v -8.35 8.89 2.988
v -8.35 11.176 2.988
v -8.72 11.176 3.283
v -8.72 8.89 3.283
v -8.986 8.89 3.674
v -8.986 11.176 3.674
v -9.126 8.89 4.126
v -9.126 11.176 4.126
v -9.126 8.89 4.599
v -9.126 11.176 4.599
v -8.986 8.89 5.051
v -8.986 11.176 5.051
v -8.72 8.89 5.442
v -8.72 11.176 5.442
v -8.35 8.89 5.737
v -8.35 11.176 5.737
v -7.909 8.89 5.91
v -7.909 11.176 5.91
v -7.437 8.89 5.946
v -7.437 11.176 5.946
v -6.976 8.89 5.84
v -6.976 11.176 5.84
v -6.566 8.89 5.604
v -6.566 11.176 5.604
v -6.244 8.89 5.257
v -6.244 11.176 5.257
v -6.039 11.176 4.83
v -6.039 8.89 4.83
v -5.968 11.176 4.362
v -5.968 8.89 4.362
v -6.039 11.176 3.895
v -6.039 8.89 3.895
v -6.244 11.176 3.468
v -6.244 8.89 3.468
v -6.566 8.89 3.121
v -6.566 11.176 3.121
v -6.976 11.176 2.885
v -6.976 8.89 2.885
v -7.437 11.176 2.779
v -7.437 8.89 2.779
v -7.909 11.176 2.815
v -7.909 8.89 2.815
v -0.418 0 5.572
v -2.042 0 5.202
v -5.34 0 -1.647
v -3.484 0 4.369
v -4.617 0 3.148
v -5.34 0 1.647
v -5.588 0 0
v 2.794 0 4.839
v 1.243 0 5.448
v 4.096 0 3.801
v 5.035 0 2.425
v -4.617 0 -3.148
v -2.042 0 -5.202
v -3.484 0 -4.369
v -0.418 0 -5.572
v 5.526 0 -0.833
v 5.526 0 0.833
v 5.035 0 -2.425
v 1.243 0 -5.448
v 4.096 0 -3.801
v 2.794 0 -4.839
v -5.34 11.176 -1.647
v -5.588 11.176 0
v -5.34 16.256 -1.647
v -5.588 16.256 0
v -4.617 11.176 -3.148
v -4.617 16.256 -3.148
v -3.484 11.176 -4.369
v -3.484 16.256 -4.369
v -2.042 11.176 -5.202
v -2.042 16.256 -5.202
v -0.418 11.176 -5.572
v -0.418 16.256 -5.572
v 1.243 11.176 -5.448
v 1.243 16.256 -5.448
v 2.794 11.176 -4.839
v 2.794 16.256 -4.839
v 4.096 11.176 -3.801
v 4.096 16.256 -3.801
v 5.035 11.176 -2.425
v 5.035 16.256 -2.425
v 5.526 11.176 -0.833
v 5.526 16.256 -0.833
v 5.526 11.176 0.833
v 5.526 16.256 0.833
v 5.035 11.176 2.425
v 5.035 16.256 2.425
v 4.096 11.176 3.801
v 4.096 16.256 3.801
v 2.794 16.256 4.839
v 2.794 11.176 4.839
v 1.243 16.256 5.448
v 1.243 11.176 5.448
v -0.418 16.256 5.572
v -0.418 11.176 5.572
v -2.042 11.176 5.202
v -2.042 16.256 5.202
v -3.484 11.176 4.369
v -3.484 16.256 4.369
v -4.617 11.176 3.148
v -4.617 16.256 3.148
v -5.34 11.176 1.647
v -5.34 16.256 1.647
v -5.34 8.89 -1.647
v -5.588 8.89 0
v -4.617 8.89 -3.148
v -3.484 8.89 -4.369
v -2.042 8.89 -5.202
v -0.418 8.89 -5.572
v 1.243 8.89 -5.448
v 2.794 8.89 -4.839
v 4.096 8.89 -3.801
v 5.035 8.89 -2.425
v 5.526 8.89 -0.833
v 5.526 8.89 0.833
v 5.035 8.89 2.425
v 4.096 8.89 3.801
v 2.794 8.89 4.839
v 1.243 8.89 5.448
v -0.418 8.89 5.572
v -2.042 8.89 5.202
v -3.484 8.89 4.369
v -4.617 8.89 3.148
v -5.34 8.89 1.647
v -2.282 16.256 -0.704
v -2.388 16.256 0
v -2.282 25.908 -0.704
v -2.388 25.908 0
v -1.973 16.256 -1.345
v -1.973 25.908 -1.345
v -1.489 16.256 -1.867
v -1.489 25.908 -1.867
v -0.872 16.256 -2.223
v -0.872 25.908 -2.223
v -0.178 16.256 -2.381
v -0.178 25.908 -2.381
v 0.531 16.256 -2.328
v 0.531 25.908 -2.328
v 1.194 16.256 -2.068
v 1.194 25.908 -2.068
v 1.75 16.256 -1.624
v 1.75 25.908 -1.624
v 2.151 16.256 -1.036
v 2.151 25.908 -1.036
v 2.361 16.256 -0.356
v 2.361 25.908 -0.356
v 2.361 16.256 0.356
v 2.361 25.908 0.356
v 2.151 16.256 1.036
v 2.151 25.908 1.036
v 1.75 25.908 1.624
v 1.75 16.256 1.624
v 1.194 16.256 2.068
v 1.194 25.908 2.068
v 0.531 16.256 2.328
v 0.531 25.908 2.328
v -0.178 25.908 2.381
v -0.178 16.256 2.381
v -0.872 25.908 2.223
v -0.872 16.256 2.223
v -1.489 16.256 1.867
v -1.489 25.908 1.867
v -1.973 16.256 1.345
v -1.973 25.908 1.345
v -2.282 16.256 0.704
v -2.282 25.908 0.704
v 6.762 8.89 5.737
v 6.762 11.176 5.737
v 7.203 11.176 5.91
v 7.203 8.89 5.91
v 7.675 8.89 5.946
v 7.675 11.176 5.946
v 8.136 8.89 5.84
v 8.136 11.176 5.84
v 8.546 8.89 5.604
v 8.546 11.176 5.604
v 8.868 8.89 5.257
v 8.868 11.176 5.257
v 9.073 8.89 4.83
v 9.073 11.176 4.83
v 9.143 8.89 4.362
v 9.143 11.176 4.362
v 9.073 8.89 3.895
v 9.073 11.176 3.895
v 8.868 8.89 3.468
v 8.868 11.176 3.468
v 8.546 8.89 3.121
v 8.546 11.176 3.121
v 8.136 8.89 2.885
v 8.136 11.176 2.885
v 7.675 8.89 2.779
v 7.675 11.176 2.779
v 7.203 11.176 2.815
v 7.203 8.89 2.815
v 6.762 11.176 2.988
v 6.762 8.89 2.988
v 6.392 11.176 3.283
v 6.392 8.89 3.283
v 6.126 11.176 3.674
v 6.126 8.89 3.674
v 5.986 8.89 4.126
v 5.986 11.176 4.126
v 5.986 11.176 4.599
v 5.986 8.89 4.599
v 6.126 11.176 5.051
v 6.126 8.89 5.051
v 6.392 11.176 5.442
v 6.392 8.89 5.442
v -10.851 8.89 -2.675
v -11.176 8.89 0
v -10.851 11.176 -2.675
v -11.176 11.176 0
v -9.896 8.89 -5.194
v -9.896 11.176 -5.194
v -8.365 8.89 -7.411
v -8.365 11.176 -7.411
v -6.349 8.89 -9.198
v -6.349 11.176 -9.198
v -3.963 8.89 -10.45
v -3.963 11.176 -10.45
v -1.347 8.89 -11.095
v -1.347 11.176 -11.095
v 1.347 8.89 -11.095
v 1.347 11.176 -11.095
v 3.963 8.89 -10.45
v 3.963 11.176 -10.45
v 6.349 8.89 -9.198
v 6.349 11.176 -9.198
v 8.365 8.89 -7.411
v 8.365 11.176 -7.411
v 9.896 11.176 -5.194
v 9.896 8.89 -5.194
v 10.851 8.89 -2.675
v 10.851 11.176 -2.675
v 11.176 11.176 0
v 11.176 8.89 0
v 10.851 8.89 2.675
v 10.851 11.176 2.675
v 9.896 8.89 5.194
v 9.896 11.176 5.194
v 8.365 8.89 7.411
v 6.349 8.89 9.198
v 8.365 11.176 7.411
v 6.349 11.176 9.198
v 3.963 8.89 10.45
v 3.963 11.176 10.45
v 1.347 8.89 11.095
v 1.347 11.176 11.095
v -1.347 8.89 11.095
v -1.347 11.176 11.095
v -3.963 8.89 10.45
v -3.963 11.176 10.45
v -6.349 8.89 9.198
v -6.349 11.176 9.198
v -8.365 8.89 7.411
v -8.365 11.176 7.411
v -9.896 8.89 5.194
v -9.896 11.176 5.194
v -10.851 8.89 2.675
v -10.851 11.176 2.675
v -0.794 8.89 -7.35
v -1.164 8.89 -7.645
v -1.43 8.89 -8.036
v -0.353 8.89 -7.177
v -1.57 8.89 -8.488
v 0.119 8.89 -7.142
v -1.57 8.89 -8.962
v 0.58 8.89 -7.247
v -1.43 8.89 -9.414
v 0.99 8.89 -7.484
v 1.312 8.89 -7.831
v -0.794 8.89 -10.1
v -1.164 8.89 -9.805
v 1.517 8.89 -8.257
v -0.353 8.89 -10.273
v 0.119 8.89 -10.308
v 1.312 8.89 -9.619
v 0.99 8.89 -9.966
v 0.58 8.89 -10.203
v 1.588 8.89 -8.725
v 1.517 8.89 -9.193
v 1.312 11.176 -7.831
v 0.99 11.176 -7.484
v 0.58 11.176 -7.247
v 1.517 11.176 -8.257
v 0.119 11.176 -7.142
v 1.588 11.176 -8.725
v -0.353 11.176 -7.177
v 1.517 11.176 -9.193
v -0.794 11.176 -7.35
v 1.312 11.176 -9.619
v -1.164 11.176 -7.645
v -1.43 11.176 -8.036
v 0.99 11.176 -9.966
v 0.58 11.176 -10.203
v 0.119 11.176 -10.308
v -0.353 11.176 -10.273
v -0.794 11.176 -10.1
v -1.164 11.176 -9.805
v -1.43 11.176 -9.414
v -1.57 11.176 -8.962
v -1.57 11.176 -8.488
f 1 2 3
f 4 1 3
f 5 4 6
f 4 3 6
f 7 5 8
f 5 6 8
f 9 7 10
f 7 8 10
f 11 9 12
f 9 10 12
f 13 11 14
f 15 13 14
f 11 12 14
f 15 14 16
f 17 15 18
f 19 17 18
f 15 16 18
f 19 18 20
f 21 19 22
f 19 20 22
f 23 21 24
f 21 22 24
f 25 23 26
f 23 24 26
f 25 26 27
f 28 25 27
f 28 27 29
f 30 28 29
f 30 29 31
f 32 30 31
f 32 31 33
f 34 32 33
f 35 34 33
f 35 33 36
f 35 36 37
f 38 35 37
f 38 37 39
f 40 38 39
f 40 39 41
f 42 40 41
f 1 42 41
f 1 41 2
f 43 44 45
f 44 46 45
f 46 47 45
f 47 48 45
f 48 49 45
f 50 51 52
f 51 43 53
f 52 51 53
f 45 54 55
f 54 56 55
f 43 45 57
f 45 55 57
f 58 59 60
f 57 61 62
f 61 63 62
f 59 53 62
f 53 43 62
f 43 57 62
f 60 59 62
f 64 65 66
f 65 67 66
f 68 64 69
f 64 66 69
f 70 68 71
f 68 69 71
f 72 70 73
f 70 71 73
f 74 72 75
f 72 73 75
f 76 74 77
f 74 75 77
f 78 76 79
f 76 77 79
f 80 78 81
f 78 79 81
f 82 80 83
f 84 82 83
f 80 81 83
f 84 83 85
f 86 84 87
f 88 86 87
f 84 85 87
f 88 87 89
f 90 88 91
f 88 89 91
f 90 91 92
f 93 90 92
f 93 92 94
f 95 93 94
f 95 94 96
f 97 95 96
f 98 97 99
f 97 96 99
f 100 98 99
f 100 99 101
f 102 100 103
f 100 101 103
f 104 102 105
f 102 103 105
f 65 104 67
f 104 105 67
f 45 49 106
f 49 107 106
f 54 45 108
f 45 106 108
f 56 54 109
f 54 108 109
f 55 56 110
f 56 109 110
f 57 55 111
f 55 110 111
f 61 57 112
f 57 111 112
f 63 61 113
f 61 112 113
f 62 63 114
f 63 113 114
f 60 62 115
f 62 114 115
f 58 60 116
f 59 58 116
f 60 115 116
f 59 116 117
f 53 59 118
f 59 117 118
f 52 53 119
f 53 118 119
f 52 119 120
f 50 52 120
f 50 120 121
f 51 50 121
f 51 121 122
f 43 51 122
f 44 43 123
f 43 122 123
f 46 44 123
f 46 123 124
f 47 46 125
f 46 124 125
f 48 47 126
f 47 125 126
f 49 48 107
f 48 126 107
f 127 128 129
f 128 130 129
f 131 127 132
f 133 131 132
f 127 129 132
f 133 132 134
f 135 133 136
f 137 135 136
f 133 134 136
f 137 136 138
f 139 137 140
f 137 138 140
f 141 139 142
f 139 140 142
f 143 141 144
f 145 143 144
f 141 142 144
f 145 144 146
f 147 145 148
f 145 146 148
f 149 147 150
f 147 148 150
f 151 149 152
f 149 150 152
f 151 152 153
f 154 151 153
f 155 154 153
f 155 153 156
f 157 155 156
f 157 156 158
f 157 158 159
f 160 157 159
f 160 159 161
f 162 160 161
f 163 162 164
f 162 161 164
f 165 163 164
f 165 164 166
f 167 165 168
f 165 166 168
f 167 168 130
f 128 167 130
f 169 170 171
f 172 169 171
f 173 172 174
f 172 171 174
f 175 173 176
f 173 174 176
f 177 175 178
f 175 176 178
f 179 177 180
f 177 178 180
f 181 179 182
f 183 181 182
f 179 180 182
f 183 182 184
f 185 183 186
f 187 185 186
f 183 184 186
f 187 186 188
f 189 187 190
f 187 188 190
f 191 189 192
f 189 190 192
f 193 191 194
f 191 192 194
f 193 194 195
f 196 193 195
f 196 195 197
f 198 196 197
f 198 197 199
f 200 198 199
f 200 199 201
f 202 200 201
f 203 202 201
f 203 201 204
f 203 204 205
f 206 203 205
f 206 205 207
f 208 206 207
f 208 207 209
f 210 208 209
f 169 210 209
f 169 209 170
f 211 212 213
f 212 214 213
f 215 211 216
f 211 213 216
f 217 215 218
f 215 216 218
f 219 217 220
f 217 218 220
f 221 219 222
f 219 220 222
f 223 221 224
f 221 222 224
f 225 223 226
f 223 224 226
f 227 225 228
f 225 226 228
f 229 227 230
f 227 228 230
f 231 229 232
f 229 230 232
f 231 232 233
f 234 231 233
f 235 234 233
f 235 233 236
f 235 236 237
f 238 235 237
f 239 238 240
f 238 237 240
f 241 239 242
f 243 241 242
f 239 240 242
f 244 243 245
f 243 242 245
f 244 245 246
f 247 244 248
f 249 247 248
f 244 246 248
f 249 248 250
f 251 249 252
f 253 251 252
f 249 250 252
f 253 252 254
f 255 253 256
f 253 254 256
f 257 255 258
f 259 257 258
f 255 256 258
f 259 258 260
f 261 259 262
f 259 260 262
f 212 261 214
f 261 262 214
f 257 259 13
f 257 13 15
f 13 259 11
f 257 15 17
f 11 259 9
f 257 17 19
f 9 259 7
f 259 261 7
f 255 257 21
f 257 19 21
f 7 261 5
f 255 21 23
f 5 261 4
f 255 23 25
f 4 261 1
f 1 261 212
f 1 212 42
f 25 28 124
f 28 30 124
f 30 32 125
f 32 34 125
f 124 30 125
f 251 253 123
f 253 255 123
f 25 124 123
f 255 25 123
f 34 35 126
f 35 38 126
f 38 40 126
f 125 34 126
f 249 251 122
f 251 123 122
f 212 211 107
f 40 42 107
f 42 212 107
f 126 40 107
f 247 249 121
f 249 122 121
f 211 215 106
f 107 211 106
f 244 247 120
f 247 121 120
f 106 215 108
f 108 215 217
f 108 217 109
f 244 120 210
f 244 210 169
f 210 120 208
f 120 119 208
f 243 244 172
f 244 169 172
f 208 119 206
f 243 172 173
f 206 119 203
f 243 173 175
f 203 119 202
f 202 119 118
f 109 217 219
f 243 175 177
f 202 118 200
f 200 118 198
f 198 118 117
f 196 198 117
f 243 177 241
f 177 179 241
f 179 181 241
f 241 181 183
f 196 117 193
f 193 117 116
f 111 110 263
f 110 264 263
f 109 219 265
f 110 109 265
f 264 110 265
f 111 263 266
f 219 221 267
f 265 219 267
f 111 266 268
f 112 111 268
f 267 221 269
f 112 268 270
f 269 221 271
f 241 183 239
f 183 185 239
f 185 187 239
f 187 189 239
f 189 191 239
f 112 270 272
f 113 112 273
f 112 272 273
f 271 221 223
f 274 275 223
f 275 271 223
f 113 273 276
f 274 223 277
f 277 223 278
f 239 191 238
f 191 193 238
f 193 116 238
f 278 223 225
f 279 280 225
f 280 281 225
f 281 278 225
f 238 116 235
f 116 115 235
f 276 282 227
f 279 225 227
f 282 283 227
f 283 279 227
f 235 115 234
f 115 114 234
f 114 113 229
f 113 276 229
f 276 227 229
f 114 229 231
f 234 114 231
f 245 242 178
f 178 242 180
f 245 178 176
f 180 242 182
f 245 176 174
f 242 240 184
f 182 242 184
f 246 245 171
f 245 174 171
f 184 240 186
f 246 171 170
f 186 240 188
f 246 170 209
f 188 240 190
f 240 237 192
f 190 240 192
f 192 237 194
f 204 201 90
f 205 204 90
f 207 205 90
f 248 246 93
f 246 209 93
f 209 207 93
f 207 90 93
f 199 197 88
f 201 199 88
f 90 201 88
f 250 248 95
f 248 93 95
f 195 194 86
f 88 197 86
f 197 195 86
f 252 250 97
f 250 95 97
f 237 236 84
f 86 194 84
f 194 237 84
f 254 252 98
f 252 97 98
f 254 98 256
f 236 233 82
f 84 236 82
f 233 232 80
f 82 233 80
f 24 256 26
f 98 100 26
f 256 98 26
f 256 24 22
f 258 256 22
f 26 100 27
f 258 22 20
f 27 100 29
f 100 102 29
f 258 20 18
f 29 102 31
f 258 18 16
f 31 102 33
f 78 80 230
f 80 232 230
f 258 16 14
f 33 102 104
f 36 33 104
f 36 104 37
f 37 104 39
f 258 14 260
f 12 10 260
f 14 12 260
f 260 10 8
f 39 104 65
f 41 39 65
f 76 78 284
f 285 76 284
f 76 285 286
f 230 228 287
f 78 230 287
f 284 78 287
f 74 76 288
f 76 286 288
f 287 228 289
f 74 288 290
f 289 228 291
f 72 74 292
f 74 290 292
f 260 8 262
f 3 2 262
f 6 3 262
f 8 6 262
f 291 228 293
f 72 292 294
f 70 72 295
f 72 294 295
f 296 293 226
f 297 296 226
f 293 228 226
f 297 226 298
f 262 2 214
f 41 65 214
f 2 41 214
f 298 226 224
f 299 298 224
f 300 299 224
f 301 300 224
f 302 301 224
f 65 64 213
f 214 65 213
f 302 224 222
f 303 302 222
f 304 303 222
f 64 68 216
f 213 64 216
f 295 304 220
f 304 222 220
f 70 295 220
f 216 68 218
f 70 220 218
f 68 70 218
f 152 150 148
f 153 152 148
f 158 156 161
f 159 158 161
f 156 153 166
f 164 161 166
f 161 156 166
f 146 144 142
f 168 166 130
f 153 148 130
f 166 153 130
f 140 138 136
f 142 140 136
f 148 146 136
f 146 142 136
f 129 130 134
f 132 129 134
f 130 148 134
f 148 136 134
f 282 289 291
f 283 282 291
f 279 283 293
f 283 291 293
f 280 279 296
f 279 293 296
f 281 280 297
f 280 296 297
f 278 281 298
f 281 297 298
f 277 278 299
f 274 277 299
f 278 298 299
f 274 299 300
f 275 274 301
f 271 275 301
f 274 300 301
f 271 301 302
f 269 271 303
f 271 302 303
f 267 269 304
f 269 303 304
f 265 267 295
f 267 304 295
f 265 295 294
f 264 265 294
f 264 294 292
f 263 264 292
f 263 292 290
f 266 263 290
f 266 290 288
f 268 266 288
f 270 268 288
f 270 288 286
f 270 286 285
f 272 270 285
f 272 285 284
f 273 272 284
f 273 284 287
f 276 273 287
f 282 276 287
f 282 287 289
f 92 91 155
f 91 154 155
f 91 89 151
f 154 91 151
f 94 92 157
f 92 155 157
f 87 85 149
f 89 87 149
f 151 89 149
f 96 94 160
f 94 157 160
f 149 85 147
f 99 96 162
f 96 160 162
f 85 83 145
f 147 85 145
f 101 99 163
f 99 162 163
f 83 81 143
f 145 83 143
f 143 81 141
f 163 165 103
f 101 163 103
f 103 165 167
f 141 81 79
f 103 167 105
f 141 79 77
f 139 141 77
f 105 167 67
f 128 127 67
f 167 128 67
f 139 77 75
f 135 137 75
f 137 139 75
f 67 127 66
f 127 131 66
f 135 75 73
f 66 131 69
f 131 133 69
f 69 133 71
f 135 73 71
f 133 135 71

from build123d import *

# Parameters (mm, degrees)
SKETCH2_R          = 1.5875
CUT_EXTRUDE1_DEPTH = 12.176
CIRPATTERN1_COUNT  = 3


with BuildPart() as part:
    # Sketch1 → Revolve1 (revolve)
    with BuildSketch(Plane.XY):
        Polygon((-5.588, 0), (-5.588, 8.89), (-11.176, 8.89), (-11.176, 11.176), (-5.588, 11.176), (-5.588, 16.256), (-2.3876, 16.256), (-2.3876, 25.908), (0, 25.908), (0, 0), align=None)
    revolve(axis=Axis((0, 25.908, 0), (0, -1, 0)))

    # Sketch2 → Cut-Extrude1 (cut, through all)
    with BuildSketch(Plane(origin=(0, 11.176, 0), x_dir=(1, 0, 0), z_dir=(0, 1, 0))):
        with Locations((0, 8.7249)):
            Circle(SKETCH2_R)
    cut_extrude1 = extrude(amount=-CUT_EXTRUDE1_DEPTH, mode=Mode.SUBTRACT)

    # CirPattern1: Cut-Extrude1 ×3 about axis
    cirpattern1_axis = Axis((0, 0, 0), (0, 1, 0))
    for i in range(1, CIRPATTERN1_COUNT):
        add(cut_extrude1.rotate(cirpattern1_axis, i * 360 / CIRPATTERN1_COUNT), mode=Mode.SUBTRACT)


solid = part.part
